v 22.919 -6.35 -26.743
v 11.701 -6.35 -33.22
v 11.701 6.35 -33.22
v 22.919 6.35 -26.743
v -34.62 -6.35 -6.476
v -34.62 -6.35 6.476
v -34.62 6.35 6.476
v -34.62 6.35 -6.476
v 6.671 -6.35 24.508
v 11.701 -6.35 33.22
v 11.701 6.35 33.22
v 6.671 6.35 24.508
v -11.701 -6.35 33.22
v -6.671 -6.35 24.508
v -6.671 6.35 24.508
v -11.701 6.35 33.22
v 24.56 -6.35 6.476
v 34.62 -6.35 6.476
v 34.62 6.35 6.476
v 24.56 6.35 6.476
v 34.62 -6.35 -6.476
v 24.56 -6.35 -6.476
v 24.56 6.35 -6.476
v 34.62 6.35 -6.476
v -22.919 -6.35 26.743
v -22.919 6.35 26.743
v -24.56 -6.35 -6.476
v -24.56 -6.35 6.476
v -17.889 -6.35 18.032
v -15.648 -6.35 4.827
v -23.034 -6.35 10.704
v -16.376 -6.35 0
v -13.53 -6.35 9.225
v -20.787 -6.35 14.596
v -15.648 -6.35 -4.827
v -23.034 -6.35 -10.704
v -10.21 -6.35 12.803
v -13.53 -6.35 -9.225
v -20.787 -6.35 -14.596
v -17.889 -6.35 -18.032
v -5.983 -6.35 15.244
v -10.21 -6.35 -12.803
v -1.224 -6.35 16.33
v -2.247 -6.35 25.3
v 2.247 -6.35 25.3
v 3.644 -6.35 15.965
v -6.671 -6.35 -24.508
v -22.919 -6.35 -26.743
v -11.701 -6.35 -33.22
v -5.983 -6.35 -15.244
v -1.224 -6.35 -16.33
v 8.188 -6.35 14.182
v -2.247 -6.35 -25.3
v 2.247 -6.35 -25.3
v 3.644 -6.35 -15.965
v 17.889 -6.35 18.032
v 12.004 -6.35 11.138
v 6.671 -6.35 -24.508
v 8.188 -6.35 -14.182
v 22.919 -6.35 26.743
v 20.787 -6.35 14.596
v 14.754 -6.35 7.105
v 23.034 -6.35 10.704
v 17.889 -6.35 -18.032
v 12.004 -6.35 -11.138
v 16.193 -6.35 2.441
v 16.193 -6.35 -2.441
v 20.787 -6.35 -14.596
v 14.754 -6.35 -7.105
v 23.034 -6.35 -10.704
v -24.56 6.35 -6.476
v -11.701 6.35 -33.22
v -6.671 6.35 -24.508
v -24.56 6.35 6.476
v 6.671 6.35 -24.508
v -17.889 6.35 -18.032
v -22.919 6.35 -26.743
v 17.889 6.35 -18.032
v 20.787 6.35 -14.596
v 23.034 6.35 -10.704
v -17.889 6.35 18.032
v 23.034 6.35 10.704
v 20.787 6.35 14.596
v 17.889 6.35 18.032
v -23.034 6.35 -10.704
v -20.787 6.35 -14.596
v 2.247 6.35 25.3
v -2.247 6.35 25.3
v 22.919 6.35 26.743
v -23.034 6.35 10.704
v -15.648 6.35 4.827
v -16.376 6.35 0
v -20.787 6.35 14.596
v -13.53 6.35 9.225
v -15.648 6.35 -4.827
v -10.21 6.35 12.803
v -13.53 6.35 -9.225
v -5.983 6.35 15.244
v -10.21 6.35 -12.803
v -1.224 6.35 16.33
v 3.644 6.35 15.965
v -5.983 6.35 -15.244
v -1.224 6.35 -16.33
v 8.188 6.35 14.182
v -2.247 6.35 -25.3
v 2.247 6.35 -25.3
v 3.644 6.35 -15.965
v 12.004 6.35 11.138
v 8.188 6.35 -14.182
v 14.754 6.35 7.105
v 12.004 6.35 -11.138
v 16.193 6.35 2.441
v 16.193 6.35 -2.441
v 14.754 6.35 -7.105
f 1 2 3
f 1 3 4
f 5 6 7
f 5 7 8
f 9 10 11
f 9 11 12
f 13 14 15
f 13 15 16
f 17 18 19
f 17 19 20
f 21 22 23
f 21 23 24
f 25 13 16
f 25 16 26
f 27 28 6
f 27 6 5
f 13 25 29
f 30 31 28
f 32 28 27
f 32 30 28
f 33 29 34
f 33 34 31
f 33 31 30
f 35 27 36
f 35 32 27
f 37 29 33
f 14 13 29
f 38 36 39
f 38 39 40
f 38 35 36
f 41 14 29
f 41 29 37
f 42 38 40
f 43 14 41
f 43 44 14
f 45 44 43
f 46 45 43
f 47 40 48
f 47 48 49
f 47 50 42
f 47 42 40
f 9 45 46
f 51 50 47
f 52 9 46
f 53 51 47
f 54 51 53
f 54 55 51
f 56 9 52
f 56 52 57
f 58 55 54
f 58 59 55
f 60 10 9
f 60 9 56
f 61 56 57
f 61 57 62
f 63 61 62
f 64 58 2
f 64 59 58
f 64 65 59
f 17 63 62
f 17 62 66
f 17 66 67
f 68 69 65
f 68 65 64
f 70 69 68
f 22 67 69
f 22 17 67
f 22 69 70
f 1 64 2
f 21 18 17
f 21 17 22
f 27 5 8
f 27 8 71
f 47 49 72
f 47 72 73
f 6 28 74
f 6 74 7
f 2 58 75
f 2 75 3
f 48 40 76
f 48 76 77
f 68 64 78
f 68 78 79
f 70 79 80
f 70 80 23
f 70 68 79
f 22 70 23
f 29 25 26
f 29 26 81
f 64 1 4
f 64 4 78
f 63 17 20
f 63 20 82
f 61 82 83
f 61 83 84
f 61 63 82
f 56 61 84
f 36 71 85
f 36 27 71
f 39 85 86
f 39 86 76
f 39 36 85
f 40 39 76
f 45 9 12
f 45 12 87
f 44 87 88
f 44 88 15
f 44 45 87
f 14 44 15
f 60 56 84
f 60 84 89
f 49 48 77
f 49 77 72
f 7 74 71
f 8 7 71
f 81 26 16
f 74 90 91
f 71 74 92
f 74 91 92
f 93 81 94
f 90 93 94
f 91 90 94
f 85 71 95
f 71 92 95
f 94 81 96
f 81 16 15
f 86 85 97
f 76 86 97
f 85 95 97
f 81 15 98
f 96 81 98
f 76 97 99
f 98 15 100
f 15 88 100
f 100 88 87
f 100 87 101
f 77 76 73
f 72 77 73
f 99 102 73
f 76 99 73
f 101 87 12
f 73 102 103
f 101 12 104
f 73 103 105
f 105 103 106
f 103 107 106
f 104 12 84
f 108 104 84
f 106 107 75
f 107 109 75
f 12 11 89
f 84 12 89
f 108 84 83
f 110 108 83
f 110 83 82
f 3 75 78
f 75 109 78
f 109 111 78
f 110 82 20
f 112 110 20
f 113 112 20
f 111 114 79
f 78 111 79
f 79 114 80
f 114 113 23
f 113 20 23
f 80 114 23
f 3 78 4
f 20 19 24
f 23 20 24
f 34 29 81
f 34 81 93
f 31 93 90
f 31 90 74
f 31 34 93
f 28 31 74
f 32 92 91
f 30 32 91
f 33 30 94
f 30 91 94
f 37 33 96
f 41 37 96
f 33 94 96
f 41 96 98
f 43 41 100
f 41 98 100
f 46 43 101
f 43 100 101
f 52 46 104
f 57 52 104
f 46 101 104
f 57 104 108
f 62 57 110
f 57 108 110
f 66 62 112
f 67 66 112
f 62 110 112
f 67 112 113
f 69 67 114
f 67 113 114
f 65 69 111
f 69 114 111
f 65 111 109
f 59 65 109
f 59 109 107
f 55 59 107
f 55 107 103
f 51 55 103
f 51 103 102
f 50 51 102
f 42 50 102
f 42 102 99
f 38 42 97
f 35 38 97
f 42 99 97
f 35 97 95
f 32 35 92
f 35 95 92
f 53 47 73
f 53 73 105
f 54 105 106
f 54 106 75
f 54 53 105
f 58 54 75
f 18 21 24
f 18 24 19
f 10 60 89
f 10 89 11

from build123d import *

# Parameters (mm, degrees)
F0_R     = 25.4
F1_DEPTH = 6.35
F3_DEPTH = 12.7
F5_COUNT = 6
F6_R     = 6.47642
F7_DEPTH = 12.7
F8_R     = 16.375735
F9_DEPTH = 12.7


with BuildPart() as f1:
    # F0 (on Front) → F1 (new body, symmetric)
    with BuildSketch(Plane.XZ):
        Circle(F0_R)
    extrude(amount=F1_DEPTH, both=True)

    # F2 (on face) → F3 (join)
    with BuildSketch(Plane.XZ.offset(6.35)):
        Polygon((-0.289307, 0), (0, 0), (-24.534516, 6.574004), (-24.534516, 6.47642), (-24.459638, 6.47642), align=None)
        Polygon((-24.534516, -6.574004), (0, 0), (-0.289307, 0), (-24.459638, -6.47642), (-24.534516, -6.47642), align=None)
        Polygon((-24.534516, 0), (-24.534516, 6.47642), (-34.619638, 6.47642), (-34.619638, -6.47642), (-24.534516, -6.47642), align=None)
    extrude(amount=-F3_DEPTH)

    # F5: F1 ×6 about axis
    f5_axis = Axis((0, -23.88444, 0), (0, -1, 0))


with BuildPart() as f1_1:
    add(f1.part)
    for i in range(1, F5_COUNT):
        add(f1.part.rotate(f5_axis, i * 360 / F5_COUNT))

    # F6 (on face) → F7 (cut)
    with BuildSketch(Plane.XZ.offset(6.35)):
        Circle(F6_R)
    extrude(amount=F7_DEPTH, mode=Mode.SUBTRACT)

    # F8 (on face) → F9 (cut)
    with BuildSketch(Plane(origin=(0, 6.35, 0), x_dir=(-1, 0, 0), z_dir=(0, 1, 0))):
        Circle(F8_R)
    extrude(amount=-F9_DEPTH, mode=Mode.SUBTRACT)


solid = f1_1.part
